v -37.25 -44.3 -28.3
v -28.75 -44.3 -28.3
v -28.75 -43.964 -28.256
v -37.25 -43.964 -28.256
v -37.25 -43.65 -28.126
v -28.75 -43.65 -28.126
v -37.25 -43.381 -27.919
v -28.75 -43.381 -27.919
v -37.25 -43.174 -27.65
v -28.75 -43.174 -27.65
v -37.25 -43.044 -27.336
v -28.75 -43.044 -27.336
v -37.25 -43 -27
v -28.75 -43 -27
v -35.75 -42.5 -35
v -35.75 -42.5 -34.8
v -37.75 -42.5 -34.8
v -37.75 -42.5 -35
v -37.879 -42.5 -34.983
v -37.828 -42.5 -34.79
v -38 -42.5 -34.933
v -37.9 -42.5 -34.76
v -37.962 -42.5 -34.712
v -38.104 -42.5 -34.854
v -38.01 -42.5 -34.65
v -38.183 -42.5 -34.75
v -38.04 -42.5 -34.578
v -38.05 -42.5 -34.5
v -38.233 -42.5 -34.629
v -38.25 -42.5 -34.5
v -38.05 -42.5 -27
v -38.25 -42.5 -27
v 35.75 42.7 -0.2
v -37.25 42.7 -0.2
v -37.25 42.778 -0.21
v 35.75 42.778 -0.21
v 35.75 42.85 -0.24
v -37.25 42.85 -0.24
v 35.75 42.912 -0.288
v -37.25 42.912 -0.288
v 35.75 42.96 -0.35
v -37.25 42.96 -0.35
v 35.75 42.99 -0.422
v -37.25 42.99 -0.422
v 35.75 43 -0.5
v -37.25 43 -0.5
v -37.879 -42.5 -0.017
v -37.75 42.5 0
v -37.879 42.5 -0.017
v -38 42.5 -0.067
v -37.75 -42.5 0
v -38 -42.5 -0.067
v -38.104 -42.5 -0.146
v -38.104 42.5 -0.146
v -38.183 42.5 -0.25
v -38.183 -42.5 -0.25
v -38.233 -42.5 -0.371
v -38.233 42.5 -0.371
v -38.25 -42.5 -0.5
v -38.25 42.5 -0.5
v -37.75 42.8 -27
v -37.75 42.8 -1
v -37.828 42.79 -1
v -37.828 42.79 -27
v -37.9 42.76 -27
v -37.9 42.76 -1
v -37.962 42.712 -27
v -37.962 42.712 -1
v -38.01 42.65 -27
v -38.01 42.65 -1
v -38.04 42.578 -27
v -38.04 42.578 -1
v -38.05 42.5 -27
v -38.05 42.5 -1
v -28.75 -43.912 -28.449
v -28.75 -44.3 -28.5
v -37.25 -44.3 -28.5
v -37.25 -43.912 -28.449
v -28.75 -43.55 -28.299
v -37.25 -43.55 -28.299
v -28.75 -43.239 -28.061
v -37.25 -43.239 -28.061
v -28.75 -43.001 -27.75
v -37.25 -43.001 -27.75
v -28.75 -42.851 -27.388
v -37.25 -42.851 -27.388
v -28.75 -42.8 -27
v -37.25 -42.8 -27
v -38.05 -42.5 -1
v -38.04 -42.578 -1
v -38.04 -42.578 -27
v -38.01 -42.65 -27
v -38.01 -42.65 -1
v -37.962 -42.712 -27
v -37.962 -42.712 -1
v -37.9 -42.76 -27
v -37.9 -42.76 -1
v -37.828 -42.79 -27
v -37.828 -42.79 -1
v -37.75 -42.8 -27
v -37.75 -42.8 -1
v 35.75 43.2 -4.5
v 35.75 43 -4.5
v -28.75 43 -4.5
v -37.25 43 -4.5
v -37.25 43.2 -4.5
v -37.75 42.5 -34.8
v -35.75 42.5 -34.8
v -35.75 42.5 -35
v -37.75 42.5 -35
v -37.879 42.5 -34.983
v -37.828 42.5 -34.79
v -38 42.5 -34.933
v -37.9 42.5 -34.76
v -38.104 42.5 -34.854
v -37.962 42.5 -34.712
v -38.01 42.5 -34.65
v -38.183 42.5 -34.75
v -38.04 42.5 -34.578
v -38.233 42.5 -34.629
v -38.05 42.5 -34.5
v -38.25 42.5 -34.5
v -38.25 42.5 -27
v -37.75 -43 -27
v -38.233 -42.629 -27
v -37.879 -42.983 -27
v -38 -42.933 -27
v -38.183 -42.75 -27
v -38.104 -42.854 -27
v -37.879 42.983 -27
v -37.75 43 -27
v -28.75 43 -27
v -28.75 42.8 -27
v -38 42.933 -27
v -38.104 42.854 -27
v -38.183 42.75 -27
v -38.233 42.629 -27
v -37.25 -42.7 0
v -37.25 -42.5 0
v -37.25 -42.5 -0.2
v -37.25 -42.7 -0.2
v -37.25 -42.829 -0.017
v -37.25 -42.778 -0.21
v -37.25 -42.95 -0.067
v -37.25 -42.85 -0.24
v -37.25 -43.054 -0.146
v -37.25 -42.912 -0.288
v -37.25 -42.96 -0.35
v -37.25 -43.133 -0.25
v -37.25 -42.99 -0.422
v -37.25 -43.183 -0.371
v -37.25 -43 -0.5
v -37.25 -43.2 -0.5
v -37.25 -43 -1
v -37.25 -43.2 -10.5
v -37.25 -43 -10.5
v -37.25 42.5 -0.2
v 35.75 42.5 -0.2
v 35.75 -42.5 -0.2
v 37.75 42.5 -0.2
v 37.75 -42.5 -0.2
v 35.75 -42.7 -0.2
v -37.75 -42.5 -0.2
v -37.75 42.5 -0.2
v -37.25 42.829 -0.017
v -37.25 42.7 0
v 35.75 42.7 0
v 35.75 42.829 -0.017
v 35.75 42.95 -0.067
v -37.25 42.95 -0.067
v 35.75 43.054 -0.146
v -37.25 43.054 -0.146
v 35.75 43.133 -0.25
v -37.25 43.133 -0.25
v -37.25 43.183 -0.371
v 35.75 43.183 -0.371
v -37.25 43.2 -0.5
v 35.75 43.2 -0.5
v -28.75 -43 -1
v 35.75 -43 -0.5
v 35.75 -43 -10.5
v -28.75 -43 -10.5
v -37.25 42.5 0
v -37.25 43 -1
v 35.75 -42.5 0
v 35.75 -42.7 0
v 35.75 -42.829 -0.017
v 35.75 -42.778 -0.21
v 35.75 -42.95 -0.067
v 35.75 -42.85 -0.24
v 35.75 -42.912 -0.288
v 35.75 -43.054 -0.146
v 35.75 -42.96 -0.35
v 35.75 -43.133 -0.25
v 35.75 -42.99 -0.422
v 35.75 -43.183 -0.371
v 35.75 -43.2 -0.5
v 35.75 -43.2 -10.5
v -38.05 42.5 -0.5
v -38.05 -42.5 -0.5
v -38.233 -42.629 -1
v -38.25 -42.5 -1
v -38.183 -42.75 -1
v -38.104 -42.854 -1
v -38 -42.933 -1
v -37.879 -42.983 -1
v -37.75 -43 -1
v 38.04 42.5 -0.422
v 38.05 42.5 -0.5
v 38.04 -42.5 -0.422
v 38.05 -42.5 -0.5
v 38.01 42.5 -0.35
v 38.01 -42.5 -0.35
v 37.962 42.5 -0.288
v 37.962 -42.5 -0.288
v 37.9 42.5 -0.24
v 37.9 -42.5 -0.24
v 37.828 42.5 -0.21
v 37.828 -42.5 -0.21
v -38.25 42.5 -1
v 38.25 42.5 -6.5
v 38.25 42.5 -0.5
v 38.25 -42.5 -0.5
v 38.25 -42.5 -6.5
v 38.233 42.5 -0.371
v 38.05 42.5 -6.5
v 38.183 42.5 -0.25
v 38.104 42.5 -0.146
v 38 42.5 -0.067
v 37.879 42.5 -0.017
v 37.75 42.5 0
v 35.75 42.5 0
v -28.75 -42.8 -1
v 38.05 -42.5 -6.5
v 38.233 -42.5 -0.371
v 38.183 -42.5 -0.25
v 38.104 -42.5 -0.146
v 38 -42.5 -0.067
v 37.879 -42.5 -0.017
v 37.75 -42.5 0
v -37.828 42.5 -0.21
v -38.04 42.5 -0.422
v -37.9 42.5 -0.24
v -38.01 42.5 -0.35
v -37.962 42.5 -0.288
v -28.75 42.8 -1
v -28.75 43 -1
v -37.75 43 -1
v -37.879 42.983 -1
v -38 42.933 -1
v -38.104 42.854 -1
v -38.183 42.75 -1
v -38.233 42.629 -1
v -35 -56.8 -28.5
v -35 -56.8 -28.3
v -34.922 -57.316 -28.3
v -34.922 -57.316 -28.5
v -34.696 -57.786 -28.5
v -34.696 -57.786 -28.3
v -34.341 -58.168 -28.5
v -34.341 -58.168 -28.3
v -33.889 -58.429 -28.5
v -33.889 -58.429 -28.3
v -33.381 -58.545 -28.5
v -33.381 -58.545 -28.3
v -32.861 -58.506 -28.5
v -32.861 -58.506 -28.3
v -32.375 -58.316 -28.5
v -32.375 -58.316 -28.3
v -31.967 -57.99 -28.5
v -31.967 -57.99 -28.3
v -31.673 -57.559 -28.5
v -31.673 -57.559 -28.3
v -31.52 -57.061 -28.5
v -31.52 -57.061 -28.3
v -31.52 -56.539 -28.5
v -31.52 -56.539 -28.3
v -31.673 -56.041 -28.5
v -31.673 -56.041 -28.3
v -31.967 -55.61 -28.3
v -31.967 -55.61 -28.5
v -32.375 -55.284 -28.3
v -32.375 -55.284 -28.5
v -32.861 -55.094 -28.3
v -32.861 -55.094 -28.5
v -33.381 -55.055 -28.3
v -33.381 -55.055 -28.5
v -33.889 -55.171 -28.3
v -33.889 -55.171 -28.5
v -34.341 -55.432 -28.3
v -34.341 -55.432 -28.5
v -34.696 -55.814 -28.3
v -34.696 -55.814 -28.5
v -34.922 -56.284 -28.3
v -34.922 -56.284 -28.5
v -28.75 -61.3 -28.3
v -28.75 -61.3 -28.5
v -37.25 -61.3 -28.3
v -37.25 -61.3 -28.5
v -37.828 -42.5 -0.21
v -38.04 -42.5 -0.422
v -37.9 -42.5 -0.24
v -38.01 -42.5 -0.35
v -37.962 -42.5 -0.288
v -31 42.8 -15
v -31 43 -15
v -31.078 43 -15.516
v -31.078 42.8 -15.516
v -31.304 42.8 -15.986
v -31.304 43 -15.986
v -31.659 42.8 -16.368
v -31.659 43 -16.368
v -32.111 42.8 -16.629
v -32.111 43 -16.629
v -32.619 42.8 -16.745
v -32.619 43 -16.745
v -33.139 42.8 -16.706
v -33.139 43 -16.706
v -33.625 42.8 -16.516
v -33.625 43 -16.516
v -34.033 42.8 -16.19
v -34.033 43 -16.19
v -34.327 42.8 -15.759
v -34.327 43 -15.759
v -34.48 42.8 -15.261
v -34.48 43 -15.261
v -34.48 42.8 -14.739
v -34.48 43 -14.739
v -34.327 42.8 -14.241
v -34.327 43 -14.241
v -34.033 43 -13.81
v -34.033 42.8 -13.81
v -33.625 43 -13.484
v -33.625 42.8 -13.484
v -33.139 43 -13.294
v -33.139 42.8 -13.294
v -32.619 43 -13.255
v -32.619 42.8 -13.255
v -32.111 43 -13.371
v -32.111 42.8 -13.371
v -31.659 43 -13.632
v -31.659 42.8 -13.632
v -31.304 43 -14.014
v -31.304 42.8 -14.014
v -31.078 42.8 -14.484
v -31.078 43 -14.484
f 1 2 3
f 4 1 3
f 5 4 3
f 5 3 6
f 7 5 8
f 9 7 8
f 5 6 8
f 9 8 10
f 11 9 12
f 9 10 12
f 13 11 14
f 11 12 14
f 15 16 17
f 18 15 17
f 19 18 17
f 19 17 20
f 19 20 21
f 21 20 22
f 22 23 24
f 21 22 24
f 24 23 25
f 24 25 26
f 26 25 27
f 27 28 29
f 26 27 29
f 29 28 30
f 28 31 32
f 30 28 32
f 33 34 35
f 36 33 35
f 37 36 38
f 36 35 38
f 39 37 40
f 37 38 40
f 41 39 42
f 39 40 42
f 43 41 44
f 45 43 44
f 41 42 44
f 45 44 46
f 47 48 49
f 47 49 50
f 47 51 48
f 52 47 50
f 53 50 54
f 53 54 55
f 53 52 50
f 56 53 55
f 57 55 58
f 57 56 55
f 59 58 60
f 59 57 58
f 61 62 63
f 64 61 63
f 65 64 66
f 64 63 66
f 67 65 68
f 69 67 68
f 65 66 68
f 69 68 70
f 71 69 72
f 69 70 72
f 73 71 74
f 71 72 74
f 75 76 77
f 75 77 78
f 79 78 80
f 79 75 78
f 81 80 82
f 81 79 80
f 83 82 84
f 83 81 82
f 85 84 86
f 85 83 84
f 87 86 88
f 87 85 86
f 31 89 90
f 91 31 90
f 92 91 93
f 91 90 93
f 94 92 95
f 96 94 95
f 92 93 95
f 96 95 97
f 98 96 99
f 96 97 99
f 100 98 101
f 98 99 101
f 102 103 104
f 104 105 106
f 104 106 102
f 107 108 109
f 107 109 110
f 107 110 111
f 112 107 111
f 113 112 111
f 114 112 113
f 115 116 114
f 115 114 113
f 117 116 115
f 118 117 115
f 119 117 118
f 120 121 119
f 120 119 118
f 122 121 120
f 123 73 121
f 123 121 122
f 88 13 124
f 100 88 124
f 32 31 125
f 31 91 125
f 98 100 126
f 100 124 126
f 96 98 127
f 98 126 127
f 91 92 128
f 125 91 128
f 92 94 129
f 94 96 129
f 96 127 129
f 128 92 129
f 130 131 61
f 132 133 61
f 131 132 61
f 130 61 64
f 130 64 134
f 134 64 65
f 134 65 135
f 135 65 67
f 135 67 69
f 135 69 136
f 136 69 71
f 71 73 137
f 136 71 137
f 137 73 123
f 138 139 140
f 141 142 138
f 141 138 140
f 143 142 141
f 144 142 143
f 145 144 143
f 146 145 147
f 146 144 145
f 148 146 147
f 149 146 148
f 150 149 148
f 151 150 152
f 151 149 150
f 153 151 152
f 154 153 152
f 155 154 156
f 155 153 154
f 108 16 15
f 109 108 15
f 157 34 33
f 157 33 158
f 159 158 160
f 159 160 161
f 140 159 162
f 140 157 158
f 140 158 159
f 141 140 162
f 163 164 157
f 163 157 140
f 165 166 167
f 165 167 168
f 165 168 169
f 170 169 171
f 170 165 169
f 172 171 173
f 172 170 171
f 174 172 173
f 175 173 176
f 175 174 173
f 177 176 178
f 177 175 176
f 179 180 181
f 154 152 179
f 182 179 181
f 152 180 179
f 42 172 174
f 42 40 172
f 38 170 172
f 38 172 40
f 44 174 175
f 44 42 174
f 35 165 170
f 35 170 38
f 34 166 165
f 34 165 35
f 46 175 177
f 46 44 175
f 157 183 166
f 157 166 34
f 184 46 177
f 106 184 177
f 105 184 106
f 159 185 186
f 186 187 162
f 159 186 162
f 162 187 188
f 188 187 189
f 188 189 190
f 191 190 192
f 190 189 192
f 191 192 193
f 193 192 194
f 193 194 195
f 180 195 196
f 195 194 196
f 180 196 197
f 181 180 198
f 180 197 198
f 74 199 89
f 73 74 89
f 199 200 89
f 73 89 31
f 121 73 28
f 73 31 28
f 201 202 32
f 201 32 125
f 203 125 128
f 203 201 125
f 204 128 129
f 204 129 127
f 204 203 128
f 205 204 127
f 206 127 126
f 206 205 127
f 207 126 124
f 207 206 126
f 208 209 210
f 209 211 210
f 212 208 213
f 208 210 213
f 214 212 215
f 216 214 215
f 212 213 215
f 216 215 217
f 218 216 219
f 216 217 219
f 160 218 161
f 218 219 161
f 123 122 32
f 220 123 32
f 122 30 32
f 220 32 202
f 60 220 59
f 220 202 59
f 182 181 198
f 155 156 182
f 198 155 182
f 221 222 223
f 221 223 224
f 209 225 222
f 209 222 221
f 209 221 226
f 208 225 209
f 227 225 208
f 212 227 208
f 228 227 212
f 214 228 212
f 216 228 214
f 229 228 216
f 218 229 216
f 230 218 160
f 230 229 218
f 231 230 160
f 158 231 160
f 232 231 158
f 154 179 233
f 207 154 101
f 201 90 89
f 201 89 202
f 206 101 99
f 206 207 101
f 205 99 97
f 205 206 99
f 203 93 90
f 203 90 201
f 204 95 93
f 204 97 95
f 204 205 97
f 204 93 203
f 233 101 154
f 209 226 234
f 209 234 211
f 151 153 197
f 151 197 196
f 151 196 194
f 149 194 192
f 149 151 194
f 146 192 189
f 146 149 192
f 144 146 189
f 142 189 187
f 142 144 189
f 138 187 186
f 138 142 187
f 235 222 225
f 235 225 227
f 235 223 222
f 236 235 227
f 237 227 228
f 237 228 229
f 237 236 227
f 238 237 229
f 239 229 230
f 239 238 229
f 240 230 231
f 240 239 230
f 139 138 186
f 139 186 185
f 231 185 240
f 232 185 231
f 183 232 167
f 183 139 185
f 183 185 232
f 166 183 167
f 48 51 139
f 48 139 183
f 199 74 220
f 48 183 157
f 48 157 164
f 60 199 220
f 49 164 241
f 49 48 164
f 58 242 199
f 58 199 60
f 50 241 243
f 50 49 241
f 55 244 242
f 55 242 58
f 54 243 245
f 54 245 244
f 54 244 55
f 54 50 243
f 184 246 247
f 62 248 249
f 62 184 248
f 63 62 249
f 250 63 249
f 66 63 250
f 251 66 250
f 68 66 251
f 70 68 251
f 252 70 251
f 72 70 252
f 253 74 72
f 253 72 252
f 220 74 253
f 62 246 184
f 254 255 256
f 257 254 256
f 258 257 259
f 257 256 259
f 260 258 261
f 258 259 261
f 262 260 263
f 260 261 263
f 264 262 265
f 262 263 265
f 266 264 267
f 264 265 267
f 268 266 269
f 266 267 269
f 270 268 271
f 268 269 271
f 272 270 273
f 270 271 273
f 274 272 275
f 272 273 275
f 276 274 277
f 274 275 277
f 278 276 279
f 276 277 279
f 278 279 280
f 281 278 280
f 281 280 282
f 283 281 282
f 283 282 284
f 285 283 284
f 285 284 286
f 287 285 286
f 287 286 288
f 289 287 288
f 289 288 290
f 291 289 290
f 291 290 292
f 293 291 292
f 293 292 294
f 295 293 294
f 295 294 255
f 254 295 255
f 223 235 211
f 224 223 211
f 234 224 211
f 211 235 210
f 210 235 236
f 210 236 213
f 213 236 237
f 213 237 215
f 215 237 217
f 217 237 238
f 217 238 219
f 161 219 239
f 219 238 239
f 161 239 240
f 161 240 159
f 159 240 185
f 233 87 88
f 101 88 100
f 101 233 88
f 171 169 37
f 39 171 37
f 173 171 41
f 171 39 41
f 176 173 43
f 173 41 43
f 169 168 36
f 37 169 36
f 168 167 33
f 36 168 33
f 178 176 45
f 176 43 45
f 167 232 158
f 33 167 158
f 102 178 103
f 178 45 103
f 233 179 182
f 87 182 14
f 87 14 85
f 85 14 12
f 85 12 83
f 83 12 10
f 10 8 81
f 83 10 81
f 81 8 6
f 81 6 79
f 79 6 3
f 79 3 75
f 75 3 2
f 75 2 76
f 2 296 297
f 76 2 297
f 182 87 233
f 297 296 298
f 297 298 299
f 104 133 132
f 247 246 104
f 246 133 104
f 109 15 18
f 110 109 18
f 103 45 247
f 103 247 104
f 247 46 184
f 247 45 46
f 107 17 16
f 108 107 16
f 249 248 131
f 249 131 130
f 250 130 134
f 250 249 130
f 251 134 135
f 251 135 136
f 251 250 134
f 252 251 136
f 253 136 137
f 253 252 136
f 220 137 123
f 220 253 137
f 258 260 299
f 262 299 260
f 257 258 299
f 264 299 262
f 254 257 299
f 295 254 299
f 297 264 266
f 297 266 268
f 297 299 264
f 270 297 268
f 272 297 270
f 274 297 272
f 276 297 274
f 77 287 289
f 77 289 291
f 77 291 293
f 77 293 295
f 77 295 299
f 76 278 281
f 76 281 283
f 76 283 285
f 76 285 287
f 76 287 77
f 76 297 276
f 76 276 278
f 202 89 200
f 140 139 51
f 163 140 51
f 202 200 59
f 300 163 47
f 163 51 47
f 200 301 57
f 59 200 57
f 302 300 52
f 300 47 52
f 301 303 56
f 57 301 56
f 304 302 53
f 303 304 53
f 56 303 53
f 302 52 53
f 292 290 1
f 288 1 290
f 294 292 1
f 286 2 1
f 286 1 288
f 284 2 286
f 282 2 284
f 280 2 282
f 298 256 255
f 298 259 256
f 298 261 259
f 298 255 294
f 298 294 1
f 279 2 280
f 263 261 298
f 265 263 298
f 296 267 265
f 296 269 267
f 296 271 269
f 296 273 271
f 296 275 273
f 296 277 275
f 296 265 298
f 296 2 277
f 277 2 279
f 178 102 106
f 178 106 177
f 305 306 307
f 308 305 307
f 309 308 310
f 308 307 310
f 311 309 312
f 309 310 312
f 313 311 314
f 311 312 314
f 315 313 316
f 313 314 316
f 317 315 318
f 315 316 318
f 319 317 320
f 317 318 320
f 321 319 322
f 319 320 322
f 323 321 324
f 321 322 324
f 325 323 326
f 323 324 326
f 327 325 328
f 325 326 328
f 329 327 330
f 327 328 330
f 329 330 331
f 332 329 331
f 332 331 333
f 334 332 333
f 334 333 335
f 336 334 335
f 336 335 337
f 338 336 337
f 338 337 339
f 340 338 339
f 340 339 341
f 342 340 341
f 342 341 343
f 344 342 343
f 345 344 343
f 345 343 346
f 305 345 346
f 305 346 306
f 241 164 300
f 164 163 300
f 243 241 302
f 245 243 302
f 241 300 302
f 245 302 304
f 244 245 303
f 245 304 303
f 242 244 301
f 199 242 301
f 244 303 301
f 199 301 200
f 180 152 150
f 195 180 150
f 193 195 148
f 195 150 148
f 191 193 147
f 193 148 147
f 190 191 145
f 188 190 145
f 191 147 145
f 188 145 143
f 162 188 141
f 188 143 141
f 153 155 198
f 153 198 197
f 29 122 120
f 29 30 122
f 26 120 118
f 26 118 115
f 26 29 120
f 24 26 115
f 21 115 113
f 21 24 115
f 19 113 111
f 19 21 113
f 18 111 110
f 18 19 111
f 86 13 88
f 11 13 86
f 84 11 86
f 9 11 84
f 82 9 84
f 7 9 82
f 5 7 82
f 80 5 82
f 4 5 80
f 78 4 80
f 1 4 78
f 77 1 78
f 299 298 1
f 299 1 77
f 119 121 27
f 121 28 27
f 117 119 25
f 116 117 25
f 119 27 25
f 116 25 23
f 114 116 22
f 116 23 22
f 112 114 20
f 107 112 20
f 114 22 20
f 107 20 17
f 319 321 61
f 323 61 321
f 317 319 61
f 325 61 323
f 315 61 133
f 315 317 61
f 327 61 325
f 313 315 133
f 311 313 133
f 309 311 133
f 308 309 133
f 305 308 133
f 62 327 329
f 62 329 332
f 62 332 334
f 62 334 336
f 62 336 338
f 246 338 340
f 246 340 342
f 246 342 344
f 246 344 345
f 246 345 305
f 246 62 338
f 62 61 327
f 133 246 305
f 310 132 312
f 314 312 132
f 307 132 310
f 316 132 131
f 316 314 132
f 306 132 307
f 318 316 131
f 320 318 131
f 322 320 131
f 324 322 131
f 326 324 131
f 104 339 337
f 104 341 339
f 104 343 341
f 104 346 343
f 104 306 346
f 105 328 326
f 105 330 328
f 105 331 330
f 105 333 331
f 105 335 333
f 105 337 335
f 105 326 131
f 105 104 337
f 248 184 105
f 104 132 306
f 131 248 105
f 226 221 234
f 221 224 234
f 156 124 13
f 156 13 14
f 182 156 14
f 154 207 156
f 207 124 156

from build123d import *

# Parameters (mm, degrees)
PAD_DEPTH       = 42.5
PAD001_DEPTH    = 26
PAD002_DEPTH    = 73
PAD003_DEPTH    = 8.5
SKETCH004_R     = 1.75
POCKET_DEPTH    = 5
SKETCH005_R     = 1.75
POCKET001_DEPTH = 5


with BuildPart() as part:
    # Sketch → Pad (new body, symmetric)
    with BuildSketch(Plane.XZ):
        with BuildLine():
            Line((-35.75, -35), (-37.75, -35))
            ThreePointArc((-38.25, -34.5), (-38.103553, -34.853553), (-37.75, -35))
            Line((-38.25, -34.5), (-38.25, -0.5))
            ThreePointArc((-37.75, 0), (-38.103553, -0.146447), (-38.25, -0.5))
            Line((-37.75, 0), (37.75, 0))
            ThreePointArc((38.25, -0.5), (38.103553, -0.146447), (37.75, 0))
            Line((38.25, -0.5), (38.25, -6.5))
            Line((38.25, -6.5), (38.05, -6.5))
            Line((38.05, -6.5), (38.05, -0.5))
            ThreePointArc((38.05, -0.5), (37.962132, -0.287868), (37.75, -0.2))
            Line((37.75, -0.2), (-37.75, -0.2))
            ThreePointArc((-37.75, -0.2), (-37.962132, -0.287868), (-38.05, -0.5))
            Line((-38.05, -0.5), (-38.05, -34.5))
            ThreePointArc((-38.05, -34.5), (-37.962132, -34.712132), (-37.75, -34.8))
            Line((-37.75, -34.8), (-35.75, -34.8))
            Line((-35.75, -34.8), (-35.75, -35))
        make_face()
    extrude(amount=PAD_DEPTH, both=True)

    # Sketch001 (on Face15 of Pad) → Pad001 (join)
    with BuildSketch(Plane(origin=(0, 0, -1), x_dir=(-1, 0, 0), z_dir=(0, 0, 1))):
        with BuildLine():
            ThreePointArc((38.25, 42.5), (38.103553, 42.853553), (37.75, 43))
            Line((37.75, 43), (28.75, 43))
            Line((28.75, 43), (28.75, 42.8))
            Line((28.75, 42.8), (37.75, 42.8))
            ThreePointArc((38.05, 42.5), (37.962132, 42.712132), (37.75, 42.8))
            Line((38.05, 42.5), (38.25, 42.5))
        make_face()
        with BuildLine():
            ThreePointArc((37.75, -43), (38.103553, -42.853553), (38.25, -42.5))
            Line((38.05, -42.5), (38.25, -42.5))
            ThreePointArc((37.75, -42.8), (37.962132, -42.712132), (38.05, -42.5))
            Line((37.75, -42.8), (28.75, -42.8))
            Line((28.75, -42.8), (28.75, -43))
            Line((28.75, -43), (37.75, -43))
        make_face()
    extrude(amount=-PAD001_DEPTH)

    # Sketch002 (on Face9 of Pad001) → Pad002 (join)
    with BuildSketch(Plane(origin=(-37.25, 0, 0), x_dir=(0, 0, -1), z_dir=(-1, 0, 0))):
        with BuildLine():
            ThreePointArc((0.5, 43.2), (0.146447, 43.053553), (0, 42.7))
            Line((0, 42.7), (0, 42.5))
            Line((0, 42.5), (0.2, 42.5))
            Line((0.2, 42.5), (0.2, 42.7))
            ThreePointArc((0.5, 43), (0.287868, 42.912132), (0.2, 42.7))
            Line((0.5, 43), (10.5, 43))
            Line((10.5, 43), (10.5, 43.2))
            Line((10.5, 43.2), (0.5, 43.2))
        make_face()
        with BuildLine():
            ThreePointArc((0, -42.7), (0.146447, -43.053553), (0.5, -43.2))
            Line((4.5, -43.2), (0.5, -43.2))
            Line((4.5, -43), (4.5, -43.2))
            Line((0.5, -43), (4.5, -43))
            ThreePointArc((0.2, -42.7), (0.287868, -42.912132), (0.5, -43))
            Line((0.2, -42.5), (0.2, -42.7))
            Line((0, -42.5), (0.2, -42.5))
            Line((0, -42.7), (0, -42.5))
        make_face()
    extrude(amount=-PAD002_DEPTH)

    # Sketch003 (on Face38 of Pad002) → Pad003 (join)
    with BuildSketch(Plane(origin=(-28.75, 0, 0), x_dir=(0, 0, 1), z_dir=(1, 0, 0))):
        with BuildLine():
            ThreePointArc((-28.3, 44.3), (-27.919239, 43.380761), (-27, 43))
            Line((-27, 43), (-27, 42.8))
            ThreePointArc((-28.5, 44.3), (-28.06066, 43.23934), (-27, 42.8))
            Line((-28.5, 61.3), (-28.5, 44.3))
            Line((-28.3, 61.3), (-28.5, 61.3))
            Line((-28.3, 44.3), (-28.3, 61.3))
        make_face()
    extrude(amount=-PAD003_DEPTH)

    # Sketch004 (on Face36 of Pad003) → Pocket (cut)
    with BuildSketch(Plane(origin=(0, 43, 0), x_dir=(1, 0, 0), z_dir=(0, 1, 0))):
        with Locations((-32.75, 15)):
            Circle(SKETCH004_R)
    extrude(amount=-POCKET_DEPTH, mode=Mode.SUBTRACT)

    # Sketch005 (on Face59 of Pocket) → Pocket001 (cut)
    with BuildSketch(Plane(origin=(0, 0, -28.3), x_dir=(-1, 0, 0), z_dir=(0, 0, 1))):
        with Locations((33.25, 56.8)):
            Circle(SKETCH005_R)
    extrude(amount=-POCKET001_DEPTH, mode=Mode.SUBTRACT)


solid = part.part
